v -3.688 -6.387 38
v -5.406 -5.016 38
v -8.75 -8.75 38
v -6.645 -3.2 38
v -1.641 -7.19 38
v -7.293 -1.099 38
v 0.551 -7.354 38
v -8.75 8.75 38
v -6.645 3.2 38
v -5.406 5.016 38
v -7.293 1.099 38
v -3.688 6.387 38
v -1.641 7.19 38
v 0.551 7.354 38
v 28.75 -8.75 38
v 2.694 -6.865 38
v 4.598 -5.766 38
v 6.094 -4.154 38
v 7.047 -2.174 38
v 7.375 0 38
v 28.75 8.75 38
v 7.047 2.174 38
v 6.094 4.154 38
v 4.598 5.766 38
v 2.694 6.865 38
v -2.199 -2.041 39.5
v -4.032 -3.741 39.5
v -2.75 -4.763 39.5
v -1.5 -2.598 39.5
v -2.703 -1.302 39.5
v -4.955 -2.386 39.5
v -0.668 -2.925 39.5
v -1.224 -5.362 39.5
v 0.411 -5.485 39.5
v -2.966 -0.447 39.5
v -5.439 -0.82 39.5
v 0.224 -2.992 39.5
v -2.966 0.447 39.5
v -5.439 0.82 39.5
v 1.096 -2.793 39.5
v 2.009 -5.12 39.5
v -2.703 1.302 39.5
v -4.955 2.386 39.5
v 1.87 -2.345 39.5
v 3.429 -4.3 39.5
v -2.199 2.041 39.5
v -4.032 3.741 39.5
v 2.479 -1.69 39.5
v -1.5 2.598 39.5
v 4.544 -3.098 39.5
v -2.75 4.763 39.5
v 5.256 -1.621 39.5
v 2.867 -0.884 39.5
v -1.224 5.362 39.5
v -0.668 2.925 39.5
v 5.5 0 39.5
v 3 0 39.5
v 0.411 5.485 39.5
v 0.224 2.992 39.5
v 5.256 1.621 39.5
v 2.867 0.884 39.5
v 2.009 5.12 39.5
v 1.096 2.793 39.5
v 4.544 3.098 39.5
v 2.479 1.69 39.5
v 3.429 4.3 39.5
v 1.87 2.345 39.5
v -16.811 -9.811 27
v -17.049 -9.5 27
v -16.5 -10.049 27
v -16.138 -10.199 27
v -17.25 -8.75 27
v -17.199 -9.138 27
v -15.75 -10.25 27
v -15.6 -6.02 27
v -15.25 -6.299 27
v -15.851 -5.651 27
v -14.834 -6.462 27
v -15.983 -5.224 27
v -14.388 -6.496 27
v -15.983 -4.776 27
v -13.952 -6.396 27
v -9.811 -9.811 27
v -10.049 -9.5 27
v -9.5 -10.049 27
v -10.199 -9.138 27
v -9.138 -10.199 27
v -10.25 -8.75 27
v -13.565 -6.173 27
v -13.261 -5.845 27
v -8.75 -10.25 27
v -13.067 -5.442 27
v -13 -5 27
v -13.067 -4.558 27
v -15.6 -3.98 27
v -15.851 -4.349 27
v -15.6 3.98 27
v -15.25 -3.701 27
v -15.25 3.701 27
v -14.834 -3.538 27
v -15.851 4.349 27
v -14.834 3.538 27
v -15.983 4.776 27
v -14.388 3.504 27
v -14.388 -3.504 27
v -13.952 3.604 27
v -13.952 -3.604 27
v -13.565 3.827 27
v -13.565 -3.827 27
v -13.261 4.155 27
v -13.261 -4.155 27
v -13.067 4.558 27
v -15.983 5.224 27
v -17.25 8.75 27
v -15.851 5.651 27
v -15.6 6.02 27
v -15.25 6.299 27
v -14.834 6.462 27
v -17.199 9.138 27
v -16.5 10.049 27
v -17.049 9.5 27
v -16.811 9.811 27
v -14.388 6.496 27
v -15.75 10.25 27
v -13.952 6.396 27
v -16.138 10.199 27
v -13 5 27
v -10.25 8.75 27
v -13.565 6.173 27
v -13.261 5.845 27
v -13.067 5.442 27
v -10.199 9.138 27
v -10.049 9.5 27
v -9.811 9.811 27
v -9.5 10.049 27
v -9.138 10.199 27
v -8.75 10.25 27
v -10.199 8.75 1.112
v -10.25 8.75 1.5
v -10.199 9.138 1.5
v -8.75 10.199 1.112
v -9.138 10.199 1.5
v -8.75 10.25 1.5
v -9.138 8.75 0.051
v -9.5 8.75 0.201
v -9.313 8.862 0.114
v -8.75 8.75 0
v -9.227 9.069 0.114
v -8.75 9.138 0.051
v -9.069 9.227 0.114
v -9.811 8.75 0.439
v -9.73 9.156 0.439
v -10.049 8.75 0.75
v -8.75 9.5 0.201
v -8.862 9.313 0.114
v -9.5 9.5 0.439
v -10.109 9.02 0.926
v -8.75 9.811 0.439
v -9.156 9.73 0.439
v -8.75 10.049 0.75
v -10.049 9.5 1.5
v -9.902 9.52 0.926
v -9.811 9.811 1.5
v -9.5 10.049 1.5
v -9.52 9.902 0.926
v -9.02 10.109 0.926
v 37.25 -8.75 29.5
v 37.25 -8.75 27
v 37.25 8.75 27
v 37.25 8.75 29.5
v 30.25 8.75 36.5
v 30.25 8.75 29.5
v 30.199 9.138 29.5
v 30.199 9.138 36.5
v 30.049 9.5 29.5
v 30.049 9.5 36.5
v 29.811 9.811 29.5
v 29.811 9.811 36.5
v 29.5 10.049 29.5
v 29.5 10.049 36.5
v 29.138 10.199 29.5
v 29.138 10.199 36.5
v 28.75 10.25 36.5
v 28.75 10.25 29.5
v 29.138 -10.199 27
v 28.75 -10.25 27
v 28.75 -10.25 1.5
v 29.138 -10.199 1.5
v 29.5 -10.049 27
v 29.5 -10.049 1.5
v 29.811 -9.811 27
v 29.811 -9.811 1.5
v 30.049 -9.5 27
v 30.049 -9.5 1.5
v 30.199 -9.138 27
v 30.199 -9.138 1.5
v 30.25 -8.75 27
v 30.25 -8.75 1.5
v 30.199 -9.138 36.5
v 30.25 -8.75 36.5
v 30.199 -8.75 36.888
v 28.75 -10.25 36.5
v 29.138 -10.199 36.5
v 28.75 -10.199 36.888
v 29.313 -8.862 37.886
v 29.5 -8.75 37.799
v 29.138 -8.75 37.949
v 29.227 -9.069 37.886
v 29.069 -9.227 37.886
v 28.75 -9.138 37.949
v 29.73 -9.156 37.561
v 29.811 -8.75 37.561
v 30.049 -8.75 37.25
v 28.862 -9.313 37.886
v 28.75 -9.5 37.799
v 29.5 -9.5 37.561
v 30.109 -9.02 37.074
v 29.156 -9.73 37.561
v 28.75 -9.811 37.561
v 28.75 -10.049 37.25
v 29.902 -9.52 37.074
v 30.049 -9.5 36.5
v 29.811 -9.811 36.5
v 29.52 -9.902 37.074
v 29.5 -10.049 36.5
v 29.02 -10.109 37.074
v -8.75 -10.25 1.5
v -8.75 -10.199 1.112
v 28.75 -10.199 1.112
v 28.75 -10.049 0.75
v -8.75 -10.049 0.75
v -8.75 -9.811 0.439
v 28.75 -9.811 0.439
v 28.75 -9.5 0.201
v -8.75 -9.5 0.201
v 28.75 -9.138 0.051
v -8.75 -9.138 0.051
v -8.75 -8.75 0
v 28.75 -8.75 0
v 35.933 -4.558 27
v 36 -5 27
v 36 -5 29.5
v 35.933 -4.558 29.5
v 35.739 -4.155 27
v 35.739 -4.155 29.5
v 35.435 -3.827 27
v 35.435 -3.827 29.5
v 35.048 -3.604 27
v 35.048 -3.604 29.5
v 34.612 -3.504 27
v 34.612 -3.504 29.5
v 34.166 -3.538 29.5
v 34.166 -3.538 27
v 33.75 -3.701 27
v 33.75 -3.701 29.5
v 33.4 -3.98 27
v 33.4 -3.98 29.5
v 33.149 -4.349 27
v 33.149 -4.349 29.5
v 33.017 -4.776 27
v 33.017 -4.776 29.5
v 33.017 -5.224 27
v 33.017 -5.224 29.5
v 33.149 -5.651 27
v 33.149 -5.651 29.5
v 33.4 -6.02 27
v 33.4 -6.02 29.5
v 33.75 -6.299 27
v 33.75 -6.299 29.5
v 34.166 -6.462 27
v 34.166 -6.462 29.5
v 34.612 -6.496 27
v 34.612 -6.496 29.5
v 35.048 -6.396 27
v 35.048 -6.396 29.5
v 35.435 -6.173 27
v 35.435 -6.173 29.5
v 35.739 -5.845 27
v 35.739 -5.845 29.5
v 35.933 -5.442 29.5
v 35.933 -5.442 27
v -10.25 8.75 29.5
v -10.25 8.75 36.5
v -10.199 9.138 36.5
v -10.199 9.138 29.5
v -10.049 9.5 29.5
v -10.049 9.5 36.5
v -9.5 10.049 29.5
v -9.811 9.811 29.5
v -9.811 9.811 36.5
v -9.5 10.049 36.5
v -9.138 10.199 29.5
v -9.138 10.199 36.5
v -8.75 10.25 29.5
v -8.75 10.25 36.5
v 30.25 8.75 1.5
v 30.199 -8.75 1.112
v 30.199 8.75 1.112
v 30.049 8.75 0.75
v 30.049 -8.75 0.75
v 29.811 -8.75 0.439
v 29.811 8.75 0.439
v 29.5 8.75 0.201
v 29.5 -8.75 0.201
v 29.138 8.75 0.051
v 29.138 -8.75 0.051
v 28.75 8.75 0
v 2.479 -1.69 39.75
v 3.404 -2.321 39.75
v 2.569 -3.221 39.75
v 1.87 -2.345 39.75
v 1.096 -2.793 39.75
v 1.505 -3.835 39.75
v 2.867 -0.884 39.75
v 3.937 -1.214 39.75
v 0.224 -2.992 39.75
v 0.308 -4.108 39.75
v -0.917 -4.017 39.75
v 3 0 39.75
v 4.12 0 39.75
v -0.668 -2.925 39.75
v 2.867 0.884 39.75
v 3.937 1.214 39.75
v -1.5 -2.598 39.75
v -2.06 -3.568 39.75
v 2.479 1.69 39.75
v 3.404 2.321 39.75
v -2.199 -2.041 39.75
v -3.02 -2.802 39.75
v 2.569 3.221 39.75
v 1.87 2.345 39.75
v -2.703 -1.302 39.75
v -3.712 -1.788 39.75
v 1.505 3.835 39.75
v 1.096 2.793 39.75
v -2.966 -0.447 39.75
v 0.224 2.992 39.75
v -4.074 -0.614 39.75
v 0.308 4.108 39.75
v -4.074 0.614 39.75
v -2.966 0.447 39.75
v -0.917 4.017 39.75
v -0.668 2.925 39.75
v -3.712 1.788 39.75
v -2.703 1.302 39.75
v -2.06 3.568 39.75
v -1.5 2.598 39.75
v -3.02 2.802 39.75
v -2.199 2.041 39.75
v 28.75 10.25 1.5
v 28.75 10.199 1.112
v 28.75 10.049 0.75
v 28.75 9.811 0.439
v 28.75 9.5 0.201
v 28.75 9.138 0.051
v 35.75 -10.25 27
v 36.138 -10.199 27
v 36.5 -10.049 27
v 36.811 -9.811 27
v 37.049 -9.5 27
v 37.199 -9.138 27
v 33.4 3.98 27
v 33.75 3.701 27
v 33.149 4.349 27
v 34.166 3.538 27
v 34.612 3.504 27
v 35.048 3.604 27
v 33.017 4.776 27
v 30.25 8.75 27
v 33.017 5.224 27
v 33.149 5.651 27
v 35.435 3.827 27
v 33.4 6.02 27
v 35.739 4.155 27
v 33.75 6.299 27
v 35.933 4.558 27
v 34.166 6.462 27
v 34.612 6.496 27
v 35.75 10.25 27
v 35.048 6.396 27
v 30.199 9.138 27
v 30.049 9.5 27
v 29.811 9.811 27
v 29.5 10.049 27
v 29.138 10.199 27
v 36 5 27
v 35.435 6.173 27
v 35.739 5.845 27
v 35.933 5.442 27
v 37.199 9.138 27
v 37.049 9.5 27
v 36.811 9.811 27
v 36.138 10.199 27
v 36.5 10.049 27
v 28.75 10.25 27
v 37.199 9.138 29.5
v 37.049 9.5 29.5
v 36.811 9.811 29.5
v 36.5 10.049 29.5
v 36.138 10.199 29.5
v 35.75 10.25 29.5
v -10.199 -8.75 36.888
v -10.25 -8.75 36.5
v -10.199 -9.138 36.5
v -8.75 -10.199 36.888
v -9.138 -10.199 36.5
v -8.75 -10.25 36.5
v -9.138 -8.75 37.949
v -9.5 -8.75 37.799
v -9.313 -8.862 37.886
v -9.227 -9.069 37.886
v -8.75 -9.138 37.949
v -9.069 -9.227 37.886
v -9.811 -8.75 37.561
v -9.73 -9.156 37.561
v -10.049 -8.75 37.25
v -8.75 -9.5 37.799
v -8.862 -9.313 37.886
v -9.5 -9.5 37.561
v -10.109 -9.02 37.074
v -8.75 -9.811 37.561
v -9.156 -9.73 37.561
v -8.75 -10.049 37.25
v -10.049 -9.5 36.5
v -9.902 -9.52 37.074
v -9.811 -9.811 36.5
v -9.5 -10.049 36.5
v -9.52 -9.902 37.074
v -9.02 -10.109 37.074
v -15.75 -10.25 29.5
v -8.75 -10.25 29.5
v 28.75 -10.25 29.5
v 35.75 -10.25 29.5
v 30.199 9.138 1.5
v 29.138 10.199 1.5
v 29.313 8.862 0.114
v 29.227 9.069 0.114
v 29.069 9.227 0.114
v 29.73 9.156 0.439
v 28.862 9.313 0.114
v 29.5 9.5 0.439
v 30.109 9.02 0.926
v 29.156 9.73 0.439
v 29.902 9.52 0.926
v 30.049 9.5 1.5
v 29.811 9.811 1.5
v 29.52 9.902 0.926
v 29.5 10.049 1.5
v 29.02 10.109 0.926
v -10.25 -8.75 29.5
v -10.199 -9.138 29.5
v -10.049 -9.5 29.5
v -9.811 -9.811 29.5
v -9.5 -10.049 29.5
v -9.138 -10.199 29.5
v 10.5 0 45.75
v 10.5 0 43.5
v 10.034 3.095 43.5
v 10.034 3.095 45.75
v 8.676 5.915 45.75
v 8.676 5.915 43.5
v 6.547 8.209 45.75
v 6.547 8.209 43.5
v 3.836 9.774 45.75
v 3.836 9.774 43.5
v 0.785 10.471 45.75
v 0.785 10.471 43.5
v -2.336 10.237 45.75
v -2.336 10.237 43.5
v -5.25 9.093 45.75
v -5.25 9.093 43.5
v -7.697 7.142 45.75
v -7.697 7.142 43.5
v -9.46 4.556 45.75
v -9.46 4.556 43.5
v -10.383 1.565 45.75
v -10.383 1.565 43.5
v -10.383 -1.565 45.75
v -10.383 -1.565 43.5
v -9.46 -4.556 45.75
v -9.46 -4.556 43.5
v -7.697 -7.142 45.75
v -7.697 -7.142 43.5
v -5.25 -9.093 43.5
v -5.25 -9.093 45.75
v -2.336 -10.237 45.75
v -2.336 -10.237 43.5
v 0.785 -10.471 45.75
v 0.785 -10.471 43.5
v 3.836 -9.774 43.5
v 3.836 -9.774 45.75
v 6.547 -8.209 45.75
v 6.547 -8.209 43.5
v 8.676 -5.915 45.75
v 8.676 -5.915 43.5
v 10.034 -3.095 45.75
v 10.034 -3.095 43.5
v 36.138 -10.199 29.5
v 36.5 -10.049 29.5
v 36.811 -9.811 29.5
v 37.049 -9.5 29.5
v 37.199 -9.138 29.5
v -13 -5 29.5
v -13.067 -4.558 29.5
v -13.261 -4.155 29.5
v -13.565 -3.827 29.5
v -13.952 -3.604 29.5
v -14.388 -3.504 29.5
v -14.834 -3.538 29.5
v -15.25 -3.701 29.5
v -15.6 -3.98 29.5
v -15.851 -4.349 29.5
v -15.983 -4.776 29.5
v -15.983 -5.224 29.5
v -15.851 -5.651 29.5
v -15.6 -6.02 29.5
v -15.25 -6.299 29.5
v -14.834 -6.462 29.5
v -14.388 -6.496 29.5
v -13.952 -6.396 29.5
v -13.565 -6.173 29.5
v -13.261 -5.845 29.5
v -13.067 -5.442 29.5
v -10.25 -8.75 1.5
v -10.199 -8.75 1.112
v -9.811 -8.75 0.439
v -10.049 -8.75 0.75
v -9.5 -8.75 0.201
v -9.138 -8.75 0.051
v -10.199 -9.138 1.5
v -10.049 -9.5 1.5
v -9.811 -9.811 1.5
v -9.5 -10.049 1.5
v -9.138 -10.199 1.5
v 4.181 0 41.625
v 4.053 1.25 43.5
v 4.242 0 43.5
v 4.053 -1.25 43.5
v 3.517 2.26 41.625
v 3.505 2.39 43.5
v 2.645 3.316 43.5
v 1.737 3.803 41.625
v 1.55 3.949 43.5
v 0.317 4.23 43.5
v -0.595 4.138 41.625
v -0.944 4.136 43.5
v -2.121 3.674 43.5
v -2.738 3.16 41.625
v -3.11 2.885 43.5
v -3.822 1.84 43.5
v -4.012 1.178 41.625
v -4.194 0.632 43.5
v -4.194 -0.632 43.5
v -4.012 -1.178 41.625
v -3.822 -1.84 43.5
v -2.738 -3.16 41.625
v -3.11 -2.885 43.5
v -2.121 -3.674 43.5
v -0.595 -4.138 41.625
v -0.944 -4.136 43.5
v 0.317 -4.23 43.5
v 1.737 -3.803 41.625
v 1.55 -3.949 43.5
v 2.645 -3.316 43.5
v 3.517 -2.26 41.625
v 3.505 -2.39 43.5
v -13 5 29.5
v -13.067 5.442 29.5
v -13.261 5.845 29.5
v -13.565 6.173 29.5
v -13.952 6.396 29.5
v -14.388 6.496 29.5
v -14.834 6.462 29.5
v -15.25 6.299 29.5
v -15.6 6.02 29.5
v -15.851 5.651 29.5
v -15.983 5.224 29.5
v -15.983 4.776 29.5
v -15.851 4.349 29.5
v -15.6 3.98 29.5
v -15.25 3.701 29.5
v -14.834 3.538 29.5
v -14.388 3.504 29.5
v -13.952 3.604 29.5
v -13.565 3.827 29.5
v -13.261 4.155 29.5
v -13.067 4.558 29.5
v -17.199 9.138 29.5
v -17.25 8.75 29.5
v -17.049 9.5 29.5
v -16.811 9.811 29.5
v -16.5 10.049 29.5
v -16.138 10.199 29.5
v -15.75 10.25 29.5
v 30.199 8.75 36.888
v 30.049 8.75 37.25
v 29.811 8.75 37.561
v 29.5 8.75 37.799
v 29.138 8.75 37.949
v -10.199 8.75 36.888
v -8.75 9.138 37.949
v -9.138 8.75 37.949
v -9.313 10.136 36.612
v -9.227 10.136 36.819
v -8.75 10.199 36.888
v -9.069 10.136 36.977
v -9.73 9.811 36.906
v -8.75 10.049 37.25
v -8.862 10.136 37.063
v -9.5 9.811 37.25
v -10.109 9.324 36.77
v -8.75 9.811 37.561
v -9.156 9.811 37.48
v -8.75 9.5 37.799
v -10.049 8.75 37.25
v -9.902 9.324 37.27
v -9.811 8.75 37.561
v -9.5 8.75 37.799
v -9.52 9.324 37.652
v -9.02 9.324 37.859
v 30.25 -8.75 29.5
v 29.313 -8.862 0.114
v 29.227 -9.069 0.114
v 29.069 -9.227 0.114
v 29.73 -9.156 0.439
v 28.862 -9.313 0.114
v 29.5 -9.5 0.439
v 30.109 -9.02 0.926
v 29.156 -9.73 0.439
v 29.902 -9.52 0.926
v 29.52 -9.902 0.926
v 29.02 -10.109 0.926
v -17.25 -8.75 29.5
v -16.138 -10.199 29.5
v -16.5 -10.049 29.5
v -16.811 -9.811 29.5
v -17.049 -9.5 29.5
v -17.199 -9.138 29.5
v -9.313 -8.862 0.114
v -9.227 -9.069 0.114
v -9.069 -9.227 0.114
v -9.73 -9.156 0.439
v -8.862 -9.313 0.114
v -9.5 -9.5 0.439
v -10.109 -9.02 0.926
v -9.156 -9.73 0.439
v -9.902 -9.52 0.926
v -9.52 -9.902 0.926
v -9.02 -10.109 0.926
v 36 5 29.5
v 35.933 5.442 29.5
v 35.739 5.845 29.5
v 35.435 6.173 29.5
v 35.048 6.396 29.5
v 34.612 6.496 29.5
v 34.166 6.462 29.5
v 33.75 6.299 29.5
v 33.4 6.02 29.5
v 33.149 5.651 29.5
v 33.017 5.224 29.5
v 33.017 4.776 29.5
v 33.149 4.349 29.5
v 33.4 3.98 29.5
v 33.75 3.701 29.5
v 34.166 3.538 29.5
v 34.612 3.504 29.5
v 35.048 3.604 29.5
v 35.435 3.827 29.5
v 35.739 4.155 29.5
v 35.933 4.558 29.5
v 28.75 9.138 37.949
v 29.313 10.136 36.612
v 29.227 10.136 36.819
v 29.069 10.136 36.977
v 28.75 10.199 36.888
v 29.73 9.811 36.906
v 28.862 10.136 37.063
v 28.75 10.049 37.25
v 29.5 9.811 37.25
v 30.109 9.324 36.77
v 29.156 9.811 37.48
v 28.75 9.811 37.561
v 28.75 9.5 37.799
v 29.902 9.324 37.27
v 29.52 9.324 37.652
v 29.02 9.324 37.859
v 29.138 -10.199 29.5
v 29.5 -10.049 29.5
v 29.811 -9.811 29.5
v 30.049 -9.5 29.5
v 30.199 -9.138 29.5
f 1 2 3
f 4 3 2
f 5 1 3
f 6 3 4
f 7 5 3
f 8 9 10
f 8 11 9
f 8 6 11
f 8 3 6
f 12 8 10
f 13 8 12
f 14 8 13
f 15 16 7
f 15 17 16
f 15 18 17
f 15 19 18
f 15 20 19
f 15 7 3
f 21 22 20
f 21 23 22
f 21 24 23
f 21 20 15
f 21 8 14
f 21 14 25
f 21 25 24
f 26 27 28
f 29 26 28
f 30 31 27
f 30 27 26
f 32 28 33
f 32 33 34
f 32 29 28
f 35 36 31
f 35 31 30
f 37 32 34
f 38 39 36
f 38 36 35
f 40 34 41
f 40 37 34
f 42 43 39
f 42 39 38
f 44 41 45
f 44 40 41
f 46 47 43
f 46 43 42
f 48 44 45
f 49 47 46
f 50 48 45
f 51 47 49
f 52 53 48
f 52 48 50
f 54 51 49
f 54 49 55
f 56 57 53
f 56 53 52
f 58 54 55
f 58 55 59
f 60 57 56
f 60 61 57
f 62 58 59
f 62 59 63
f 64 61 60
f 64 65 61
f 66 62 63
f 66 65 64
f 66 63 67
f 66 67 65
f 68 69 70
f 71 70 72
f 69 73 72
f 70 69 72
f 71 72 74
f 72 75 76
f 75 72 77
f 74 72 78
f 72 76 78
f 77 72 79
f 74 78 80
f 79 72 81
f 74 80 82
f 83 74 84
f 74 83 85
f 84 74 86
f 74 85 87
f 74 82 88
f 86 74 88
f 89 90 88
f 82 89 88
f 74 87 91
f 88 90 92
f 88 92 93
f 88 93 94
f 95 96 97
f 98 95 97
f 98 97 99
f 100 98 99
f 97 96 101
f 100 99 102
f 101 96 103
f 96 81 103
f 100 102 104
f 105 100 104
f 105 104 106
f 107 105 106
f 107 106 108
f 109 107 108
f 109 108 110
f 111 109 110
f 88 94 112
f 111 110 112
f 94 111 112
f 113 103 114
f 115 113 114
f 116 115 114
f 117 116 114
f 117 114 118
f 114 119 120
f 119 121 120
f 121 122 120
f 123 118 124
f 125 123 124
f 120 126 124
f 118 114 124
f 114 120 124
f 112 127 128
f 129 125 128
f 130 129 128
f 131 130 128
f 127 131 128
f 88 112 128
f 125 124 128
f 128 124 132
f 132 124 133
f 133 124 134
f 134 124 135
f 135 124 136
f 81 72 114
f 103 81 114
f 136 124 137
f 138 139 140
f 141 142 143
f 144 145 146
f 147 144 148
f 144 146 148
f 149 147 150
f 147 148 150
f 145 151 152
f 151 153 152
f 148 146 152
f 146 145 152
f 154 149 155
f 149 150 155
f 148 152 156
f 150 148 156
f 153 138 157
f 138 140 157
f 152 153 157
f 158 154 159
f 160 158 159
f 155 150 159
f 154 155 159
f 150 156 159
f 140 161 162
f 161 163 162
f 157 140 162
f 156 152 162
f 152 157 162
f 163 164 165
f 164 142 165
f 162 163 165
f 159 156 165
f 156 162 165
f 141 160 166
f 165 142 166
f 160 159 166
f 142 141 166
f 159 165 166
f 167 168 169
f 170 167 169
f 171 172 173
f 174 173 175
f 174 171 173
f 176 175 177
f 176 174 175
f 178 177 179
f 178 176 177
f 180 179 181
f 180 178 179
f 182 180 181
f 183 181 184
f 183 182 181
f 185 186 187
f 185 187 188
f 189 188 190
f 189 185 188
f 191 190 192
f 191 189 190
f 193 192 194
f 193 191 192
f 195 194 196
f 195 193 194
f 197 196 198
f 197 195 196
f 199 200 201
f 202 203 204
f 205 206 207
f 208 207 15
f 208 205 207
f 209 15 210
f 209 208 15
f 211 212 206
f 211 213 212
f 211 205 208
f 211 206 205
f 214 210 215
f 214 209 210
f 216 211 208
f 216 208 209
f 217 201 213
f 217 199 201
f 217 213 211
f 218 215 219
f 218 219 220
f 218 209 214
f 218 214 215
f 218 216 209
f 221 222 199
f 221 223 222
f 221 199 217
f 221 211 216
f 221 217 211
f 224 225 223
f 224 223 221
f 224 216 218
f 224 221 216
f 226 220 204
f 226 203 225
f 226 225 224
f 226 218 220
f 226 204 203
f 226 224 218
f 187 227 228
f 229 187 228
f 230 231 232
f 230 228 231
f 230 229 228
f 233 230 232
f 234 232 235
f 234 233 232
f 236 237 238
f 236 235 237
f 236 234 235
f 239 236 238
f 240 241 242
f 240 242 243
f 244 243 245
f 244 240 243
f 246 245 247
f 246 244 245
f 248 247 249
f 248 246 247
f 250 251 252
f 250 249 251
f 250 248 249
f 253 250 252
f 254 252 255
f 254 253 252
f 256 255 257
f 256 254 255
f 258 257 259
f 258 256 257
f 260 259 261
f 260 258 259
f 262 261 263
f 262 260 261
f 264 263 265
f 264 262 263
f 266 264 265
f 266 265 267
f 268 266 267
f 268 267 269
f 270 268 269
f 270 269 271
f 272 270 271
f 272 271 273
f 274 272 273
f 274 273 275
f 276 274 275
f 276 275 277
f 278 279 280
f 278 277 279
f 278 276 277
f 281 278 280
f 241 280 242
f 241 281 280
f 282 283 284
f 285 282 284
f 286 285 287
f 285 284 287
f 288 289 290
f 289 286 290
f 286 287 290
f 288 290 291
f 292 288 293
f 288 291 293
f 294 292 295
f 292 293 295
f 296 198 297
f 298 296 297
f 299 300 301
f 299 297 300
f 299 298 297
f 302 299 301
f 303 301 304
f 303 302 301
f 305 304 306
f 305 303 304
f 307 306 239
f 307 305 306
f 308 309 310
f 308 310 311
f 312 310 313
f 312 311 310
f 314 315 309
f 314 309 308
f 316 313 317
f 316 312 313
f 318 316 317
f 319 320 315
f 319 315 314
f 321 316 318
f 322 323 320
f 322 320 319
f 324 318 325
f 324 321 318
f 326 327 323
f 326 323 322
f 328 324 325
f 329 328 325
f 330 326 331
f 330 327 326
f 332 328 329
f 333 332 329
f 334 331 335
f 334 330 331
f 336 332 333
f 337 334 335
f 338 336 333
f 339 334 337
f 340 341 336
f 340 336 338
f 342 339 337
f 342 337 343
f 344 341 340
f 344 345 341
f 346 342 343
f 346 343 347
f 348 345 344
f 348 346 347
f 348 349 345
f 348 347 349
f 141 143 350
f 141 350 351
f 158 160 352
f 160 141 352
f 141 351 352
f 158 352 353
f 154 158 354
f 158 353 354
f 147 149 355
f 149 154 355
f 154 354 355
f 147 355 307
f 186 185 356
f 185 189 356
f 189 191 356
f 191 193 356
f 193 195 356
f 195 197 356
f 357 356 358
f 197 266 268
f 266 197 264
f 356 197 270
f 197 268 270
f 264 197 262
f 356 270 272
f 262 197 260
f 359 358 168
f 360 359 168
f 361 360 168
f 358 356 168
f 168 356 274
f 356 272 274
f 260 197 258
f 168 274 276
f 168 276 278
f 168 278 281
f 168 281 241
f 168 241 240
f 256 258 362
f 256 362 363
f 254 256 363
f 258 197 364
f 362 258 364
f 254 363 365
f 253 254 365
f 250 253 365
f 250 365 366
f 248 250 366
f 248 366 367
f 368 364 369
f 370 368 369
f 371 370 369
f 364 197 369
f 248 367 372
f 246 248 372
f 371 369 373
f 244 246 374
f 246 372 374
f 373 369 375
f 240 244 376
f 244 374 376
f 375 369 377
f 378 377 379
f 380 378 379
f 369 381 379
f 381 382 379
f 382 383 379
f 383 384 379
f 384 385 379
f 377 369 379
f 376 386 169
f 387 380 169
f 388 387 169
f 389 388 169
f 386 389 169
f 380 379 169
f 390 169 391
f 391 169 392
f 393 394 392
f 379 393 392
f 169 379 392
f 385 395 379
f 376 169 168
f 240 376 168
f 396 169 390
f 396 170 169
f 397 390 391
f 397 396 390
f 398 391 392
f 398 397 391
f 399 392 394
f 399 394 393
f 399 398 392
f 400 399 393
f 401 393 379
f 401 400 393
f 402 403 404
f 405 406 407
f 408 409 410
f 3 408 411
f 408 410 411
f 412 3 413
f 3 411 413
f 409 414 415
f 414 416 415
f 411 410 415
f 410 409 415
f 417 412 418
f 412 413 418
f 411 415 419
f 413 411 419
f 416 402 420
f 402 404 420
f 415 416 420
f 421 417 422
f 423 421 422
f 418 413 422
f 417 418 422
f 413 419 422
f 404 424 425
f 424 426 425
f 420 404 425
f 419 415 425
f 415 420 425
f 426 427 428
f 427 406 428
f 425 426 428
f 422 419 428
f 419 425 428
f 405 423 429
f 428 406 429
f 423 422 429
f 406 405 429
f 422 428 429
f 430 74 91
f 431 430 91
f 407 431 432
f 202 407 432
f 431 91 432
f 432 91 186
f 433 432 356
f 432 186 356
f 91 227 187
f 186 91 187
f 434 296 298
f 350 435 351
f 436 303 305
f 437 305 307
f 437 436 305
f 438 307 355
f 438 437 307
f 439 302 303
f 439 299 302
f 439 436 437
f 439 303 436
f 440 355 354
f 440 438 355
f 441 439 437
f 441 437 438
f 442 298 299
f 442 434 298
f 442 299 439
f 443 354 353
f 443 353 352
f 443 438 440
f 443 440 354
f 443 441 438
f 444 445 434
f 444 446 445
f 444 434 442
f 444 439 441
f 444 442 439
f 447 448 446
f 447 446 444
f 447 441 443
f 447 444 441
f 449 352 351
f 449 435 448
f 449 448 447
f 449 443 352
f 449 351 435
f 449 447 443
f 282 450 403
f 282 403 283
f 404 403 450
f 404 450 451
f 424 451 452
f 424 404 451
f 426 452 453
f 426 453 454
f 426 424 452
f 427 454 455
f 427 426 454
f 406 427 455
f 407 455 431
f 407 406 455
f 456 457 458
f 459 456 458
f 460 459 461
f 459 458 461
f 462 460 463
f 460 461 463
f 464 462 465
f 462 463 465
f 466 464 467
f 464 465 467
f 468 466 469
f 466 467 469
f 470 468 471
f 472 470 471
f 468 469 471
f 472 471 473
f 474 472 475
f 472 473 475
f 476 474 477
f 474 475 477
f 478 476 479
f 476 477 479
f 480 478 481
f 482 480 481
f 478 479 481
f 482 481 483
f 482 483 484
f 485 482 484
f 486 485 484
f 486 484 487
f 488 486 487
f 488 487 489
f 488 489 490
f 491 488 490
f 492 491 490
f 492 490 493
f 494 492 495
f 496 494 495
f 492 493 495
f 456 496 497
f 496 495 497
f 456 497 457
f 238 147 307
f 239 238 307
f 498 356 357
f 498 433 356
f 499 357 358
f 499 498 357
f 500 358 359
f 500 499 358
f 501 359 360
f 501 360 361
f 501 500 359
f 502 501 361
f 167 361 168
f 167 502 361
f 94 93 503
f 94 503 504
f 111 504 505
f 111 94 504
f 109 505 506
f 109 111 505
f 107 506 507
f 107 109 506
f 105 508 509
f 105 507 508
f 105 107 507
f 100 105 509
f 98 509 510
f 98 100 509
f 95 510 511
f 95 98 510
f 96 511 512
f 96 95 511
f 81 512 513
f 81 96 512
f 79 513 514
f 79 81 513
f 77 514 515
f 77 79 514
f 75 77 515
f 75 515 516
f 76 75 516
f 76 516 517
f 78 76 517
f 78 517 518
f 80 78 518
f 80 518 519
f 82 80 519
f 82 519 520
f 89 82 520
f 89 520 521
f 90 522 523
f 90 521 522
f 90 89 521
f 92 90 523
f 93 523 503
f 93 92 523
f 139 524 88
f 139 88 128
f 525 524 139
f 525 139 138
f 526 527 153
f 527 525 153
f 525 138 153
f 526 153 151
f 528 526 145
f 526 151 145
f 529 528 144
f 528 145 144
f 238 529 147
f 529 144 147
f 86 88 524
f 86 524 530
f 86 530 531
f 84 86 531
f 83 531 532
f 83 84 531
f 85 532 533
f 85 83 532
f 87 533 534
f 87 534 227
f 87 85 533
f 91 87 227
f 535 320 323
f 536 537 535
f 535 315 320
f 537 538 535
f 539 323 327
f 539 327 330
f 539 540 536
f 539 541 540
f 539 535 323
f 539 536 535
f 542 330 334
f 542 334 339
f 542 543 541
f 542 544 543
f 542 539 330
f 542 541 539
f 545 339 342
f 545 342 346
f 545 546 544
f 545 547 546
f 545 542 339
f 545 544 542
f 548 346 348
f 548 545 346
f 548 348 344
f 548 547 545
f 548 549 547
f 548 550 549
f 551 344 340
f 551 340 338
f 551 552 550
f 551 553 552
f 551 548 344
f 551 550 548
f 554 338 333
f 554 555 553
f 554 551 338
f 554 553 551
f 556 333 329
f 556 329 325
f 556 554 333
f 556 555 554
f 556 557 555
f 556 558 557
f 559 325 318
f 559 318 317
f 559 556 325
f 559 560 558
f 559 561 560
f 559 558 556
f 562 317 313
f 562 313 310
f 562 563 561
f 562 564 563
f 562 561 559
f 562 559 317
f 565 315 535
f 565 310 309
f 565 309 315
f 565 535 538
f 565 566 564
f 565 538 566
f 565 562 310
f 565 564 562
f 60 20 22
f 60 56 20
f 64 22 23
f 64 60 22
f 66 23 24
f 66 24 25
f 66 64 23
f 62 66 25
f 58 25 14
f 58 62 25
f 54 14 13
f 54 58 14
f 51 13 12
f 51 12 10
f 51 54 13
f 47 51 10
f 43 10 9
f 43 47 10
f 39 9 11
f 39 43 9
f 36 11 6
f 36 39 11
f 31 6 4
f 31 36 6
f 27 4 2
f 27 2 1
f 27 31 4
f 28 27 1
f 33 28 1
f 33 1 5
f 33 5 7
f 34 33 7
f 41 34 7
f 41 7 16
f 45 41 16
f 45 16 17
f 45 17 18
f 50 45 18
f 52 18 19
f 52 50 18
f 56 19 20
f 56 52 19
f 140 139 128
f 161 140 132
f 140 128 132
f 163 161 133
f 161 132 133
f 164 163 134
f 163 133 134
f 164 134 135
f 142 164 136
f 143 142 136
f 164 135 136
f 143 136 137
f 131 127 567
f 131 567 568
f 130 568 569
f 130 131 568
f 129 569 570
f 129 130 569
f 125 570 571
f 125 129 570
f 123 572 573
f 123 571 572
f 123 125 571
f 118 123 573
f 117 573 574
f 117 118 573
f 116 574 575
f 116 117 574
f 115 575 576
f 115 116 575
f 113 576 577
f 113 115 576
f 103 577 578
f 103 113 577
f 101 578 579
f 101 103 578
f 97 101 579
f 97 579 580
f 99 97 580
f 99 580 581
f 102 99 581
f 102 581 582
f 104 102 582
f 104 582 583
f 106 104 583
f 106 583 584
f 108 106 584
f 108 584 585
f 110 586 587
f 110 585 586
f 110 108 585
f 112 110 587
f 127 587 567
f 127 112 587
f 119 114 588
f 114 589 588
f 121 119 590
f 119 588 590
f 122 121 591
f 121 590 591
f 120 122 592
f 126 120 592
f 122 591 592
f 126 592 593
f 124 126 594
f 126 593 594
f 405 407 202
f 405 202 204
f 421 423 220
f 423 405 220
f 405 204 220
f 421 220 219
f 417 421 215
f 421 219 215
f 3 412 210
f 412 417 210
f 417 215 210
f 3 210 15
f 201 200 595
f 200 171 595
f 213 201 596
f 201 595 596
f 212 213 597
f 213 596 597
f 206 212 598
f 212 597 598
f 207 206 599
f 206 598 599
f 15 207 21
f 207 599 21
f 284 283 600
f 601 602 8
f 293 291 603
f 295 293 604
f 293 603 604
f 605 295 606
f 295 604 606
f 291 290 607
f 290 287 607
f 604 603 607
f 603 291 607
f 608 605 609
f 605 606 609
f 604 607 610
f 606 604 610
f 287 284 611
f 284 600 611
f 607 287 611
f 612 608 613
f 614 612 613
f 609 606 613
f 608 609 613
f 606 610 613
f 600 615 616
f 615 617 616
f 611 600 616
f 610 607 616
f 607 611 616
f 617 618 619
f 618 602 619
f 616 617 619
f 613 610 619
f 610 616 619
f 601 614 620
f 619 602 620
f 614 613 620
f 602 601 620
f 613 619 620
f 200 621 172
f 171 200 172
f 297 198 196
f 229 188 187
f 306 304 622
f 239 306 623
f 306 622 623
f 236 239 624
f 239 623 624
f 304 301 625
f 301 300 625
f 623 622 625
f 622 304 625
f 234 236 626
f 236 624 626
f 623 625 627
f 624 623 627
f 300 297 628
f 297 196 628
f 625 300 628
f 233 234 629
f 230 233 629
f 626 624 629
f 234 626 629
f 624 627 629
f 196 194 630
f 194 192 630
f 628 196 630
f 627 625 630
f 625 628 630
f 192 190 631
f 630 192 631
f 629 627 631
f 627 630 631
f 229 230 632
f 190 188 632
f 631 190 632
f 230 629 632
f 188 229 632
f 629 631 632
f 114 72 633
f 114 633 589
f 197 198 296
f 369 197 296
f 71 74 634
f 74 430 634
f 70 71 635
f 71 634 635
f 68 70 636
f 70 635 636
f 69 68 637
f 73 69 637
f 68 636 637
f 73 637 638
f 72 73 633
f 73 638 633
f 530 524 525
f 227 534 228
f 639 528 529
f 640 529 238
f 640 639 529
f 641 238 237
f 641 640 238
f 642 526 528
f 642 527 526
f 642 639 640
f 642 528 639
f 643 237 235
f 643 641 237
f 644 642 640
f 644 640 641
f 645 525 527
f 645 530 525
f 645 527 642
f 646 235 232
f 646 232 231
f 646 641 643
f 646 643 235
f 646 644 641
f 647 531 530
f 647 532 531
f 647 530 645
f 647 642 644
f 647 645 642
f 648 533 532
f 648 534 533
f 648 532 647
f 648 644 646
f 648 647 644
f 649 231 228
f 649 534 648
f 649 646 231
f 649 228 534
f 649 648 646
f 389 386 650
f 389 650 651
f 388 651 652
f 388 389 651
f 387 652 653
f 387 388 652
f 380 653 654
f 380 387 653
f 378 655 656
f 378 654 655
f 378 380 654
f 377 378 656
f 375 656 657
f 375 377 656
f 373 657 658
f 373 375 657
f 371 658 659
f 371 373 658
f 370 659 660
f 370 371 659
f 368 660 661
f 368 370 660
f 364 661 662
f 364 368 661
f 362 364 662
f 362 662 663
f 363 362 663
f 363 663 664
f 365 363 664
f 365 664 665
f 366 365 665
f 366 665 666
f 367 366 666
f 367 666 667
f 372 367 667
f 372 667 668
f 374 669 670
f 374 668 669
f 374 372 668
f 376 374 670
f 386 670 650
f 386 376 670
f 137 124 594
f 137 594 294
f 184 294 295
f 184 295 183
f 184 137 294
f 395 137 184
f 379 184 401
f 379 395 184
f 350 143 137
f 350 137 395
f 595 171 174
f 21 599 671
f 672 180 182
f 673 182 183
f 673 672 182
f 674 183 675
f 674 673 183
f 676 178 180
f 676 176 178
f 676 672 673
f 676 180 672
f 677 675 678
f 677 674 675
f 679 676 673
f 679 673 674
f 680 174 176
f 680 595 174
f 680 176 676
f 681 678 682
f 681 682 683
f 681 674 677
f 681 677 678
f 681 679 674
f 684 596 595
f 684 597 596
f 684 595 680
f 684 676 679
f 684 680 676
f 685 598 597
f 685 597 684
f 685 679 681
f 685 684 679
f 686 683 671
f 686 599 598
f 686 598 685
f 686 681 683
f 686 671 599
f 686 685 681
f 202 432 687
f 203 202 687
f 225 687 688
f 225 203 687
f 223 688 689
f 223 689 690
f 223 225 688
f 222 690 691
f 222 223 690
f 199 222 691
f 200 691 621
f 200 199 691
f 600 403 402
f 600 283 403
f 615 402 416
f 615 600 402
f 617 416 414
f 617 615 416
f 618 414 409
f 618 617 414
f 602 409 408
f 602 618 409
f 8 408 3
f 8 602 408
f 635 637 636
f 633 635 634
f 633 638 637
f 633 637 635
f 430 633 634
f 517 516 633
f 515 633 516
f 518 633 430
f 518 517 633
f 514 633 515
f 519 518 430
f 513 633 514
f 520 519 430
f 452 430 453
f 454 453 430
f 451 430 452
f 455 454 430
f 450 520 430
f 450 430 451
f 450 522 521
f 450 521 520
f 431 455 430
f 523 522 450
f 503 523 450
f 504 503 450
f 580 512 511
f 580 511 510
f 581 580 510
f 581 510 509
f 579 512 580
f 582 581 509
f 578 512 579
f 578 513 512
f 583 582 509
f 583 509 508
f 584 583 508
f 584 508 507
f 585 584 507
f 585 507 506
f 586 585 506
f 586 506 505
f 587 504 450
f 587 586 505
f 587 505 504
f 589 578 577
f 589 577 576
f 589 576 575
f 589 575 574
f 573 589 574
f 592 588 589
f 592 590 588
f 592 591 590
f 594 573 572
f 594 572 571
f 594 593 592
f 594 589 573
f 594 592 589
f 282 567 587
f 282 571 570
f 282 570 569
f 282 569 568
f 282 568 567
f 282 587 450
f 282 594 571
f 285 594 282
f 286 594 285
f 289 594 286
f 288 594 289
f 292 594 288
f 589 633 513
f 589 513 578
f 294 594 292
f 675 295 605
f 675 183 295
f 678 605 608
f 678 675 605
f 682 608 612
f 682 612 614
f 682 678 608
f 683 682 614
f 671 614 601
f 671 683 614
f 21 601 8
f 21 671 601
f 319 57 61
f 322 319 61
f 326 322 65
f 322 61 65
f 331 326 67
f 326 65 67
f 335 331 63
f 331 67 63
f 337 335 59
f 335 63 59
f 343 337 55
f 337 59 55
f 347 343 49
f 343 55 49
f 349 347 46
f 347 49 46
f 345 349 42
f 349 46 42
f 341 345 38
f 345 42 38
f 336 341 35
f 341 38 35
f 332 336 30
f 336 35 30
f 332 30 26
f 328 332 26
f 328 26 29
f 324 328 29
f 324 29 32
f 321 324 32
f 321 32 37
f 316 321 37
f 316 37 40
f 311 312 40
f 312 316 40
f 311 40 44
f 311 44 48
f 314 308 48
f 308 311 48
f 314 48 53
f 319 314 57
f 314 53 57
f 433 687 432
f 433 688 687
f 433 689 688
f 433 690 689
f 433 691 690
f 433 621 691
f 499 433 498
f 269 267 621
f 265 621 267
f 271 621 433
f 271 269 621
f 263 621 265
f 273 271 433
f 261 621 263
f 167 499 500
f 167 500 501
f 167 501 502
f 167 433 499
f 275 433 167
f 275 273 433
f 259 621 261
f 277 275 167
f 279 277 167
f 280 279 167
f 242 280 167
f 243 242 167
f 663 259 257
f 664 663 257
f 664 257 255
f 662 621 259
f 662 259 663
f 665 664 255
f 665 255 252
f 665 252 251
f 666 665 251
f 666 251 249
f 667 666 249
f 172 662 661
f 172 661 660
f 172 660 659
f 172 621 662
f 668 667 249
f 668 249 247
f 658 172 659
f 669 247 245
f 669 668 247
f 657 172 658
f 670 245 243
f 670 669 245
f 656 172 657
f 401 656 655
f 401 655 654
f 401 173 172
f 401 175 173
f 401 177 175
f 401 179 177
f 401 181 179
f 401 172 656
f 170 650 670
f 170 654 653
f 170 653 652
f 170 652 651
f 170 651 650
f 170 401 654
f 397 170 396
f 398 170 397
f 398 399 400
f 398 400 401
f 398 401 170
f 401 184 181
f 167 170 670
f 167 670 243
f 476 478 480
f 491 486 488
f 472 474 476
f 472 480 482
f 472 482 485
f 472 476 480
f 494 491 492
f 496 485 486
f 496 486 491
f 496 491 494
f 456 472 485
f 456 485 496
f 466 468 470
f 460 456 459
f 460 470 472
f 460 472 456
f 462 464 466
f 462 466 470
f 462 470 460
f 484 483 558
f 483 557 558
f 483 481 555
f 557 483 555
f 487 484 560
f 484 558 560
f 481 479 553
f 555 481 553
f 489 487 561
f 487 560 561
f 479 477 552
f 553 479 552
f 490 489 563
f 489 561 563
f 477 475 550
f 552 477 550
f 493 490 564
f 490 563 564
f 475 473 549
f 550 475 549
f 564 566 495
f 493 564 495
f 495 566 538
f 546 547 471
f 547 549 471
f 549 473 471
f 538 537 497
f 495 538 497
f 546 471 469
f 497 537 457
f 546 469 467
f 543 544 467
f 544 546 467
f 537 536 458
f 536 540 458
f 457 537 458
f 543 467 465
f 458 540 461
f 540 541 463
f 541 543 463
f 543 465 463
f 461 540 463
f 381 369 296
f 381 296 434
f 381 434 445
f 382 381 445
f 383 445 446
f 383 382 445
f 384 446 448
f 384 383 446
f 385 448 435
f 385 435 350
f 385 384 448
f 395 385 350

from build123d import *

# Parameters (mm, degrees)
CYLINDER001_R     = 3
CYLINDER001_DEPTH = 4.5
CYLINDER002_R     = 1.5
CYLINDER002_DEPTH = 5
BOX001_W          = 54.5
BOX001_H          = 20.5
BOX001_DEPTH      = 2.5
FILLET_R          = 1.5
FILLET001_R       = 1.5
FILLET002_R       = 1.5
FILLET003_R       = 1.5
BOX_W             = 40.5
BOX_H             = 20.5
BOX_DEPTH         = 38
FILLET004_R       = 1.5
CYLINDER_R        = 10.5
CYLINDER_DEPTH    = 2.25


with BuildPart() as servobodycone:
    # Cone → Cone (revolve)
    with BuildSketch(Plane(origin=(0, 0, 37.5), x_dir=(1, 0, 0), z_dir=(0, -1, 0))):
        Polygon((0, 0), (8, 0), (5.5, 2), (0, 2), align=None)
    revolve(axis=Axis((0, 0, 37.5), (0, 0, 1)))


with BuildPart() as cone001:
    # Cone001 → Cone001 (revolve)
    with BuildSketch(Plane(origin=(0, 0, 39.75), x_dir=(1, 0, 0), z_dir=(0, -1, 0))):
        Polygon((0, 0), (4.12, 0), (4.25, 4), (0, 4), align=None)
    revolve(axis=Axis((0, 0, 39.75), (0, 0, 1)))


with BuildPart() as shaft:
    # Cylinder001 → Cylinder001 (new body)
    with BuildSketch(Plane.XY.offset(38.5)):
        Circle(CYLINDER001_R)
    extrude(amount=CYLINDER001_DEPTH)


with BuildPart() as screw_hole1:
    # Cylinder002 → Cylinder002 (new body)
    with BuildSketch(Plane(origin=(-14.5, 5, 26), x_dir=(1, 0, 0), z_dir=(0, 0, 1))):
        Circle(CYLINDER002_R)
    extrude(amount=CYLINDER002_DEPTH)


with BuildPart() as screw_hole3:
    # Clone001 base: copy of Screw_hole1
    add(screw_hole1.part)


with BuildPart() as screw_hole3_1:
    # Clone001 placement: moved
    add(screw_hole3.part.moved(Location((49, 0, 0))))


with BuildPart() as screw_hole4:
    # Clone002 base: copy of Screw_hole3
    add(screw_hole3_1.part)


with BuildPart() as screw_hole4_1:
    # Clone002 placement: moved
    add(screw_hole4.part.moved(Location((0, -10, 0))))


with BuildPart() as screw_hole2:
    # Clone base: copy of Screw_hole1
    add(screw_hole1.part)


with BuildPart() as screw_hole2_1:
    # Clone placement: moved
    add(screw_hole2.part.moved(Location((0, -10, 0))))


with BuildPart() as servo_lugs001:
    # Box001 → Box001 (new body)
    with BuildSketch(Plane(origin=(-17.25, -10.25, 27), x_dir=(1, 0, 0), z_dir=(0, 0, 1))):
        with Locations((27.25, 10.25)):
            Rectangle(BOX001_W, BOX001_H)
    extrude(amount=BOX001_DEPTH)

    # Cut: cut Screw_hole1
    add(screw_hole1.part, mode=Mode.SUBTRACT)

    # Cut001: cut Screw_hole2
    add(screw_hole2_1.part, mode=Mode.SUBTRACT)

    # Cut002: cut Screw_hole3
    add(screw_hole3_1.part, mode=Mode.SUBTRACT)

    # Cut003: cut Screw_hole4
    add(screw_hole4_1.part, mode=Mode.SUBTRACT)

    # Fillet
    fillet_edges = [servo_lugs001.edges().sort_by_distance(p)[0] for p in [
        (37.25, -10.25, 28.25),
    ]]
    fillet(fillet_edges, radius=FILLET_R)

    # Fillet001
    fillet001_edges = [servo_lugs001.edges().sort_by_distance(p)[0] for p in [
        (37.25, 10.25, 28.25),
    ]]
    fillet(fillet001_edges, radius=FILLET001_R)

    # Fillet002
    fillet002_edges = [servo_lugs001.edges().sort_by_distance(p)[0] for p in [
        (-17.25, -10.25, 28.25),
    ]]
    fillet(fillet002_edges, radius=FILLET002_R)

    # Fillet003
    fillet003_edges = [servo_lugs001.edges().sort_by_distance(p)[0] for p in [
        (-17.25, 10.25, 28.25),
    ]]
    fillet(fillet003_edges, radius=FILLET003_R)


with BuildPart() as servobody001:
    # Box → Box (new body)
    with BuildSketch(Plane(origin=(-10.25, -10.25, 0), x_dir=(1, 0, 0), z_dir=(0, 0, 1))):
        with Locations((20.25, 10.25)):
            Rectangle(BOX_W, BOX_H)
    extrude(amount=BOX_DEPTH)

    # Fillet004
    fillet004_edges = [servobody001.edges().sort_by_distance(p)[0] for p in [
        (-10.25, -10.25, 19),
        (-10.25, 0, 38),
        (-10.25, 10.25, 19),
        (-10.25, 0, 0),
        (30.25, -10.25, 19),
        (30.25, 0, 38),
        (30.25, 10.25, 19),
        (30.25, 0, 0),
        (10, -10.25, 0),
        (10, -10.25, 38),
        (10, 10.25, 0),
        (10, 10.25, 38),
    ]]
    fillet(fillet004_edges, radius=FILLET004_R)


with BuildPart() as servo:
    # Cylinder → Cylinder (new body)
    with BuildSketch(Plane.XY.offset(43.5)):
        Circle(CYLINDER_R)
    extrude(amount=CYLINDER_DEPTH)

    # Fusion: union ServoBodyCone, Cone001, shaft, servo_lugs001, ServoBody001
    add(servobodycone.part)
    add(cone001.part)
    add(shaft.part)
    add(servo_lugs001.part)
    add(servobody001.part)


solid = servo.part
